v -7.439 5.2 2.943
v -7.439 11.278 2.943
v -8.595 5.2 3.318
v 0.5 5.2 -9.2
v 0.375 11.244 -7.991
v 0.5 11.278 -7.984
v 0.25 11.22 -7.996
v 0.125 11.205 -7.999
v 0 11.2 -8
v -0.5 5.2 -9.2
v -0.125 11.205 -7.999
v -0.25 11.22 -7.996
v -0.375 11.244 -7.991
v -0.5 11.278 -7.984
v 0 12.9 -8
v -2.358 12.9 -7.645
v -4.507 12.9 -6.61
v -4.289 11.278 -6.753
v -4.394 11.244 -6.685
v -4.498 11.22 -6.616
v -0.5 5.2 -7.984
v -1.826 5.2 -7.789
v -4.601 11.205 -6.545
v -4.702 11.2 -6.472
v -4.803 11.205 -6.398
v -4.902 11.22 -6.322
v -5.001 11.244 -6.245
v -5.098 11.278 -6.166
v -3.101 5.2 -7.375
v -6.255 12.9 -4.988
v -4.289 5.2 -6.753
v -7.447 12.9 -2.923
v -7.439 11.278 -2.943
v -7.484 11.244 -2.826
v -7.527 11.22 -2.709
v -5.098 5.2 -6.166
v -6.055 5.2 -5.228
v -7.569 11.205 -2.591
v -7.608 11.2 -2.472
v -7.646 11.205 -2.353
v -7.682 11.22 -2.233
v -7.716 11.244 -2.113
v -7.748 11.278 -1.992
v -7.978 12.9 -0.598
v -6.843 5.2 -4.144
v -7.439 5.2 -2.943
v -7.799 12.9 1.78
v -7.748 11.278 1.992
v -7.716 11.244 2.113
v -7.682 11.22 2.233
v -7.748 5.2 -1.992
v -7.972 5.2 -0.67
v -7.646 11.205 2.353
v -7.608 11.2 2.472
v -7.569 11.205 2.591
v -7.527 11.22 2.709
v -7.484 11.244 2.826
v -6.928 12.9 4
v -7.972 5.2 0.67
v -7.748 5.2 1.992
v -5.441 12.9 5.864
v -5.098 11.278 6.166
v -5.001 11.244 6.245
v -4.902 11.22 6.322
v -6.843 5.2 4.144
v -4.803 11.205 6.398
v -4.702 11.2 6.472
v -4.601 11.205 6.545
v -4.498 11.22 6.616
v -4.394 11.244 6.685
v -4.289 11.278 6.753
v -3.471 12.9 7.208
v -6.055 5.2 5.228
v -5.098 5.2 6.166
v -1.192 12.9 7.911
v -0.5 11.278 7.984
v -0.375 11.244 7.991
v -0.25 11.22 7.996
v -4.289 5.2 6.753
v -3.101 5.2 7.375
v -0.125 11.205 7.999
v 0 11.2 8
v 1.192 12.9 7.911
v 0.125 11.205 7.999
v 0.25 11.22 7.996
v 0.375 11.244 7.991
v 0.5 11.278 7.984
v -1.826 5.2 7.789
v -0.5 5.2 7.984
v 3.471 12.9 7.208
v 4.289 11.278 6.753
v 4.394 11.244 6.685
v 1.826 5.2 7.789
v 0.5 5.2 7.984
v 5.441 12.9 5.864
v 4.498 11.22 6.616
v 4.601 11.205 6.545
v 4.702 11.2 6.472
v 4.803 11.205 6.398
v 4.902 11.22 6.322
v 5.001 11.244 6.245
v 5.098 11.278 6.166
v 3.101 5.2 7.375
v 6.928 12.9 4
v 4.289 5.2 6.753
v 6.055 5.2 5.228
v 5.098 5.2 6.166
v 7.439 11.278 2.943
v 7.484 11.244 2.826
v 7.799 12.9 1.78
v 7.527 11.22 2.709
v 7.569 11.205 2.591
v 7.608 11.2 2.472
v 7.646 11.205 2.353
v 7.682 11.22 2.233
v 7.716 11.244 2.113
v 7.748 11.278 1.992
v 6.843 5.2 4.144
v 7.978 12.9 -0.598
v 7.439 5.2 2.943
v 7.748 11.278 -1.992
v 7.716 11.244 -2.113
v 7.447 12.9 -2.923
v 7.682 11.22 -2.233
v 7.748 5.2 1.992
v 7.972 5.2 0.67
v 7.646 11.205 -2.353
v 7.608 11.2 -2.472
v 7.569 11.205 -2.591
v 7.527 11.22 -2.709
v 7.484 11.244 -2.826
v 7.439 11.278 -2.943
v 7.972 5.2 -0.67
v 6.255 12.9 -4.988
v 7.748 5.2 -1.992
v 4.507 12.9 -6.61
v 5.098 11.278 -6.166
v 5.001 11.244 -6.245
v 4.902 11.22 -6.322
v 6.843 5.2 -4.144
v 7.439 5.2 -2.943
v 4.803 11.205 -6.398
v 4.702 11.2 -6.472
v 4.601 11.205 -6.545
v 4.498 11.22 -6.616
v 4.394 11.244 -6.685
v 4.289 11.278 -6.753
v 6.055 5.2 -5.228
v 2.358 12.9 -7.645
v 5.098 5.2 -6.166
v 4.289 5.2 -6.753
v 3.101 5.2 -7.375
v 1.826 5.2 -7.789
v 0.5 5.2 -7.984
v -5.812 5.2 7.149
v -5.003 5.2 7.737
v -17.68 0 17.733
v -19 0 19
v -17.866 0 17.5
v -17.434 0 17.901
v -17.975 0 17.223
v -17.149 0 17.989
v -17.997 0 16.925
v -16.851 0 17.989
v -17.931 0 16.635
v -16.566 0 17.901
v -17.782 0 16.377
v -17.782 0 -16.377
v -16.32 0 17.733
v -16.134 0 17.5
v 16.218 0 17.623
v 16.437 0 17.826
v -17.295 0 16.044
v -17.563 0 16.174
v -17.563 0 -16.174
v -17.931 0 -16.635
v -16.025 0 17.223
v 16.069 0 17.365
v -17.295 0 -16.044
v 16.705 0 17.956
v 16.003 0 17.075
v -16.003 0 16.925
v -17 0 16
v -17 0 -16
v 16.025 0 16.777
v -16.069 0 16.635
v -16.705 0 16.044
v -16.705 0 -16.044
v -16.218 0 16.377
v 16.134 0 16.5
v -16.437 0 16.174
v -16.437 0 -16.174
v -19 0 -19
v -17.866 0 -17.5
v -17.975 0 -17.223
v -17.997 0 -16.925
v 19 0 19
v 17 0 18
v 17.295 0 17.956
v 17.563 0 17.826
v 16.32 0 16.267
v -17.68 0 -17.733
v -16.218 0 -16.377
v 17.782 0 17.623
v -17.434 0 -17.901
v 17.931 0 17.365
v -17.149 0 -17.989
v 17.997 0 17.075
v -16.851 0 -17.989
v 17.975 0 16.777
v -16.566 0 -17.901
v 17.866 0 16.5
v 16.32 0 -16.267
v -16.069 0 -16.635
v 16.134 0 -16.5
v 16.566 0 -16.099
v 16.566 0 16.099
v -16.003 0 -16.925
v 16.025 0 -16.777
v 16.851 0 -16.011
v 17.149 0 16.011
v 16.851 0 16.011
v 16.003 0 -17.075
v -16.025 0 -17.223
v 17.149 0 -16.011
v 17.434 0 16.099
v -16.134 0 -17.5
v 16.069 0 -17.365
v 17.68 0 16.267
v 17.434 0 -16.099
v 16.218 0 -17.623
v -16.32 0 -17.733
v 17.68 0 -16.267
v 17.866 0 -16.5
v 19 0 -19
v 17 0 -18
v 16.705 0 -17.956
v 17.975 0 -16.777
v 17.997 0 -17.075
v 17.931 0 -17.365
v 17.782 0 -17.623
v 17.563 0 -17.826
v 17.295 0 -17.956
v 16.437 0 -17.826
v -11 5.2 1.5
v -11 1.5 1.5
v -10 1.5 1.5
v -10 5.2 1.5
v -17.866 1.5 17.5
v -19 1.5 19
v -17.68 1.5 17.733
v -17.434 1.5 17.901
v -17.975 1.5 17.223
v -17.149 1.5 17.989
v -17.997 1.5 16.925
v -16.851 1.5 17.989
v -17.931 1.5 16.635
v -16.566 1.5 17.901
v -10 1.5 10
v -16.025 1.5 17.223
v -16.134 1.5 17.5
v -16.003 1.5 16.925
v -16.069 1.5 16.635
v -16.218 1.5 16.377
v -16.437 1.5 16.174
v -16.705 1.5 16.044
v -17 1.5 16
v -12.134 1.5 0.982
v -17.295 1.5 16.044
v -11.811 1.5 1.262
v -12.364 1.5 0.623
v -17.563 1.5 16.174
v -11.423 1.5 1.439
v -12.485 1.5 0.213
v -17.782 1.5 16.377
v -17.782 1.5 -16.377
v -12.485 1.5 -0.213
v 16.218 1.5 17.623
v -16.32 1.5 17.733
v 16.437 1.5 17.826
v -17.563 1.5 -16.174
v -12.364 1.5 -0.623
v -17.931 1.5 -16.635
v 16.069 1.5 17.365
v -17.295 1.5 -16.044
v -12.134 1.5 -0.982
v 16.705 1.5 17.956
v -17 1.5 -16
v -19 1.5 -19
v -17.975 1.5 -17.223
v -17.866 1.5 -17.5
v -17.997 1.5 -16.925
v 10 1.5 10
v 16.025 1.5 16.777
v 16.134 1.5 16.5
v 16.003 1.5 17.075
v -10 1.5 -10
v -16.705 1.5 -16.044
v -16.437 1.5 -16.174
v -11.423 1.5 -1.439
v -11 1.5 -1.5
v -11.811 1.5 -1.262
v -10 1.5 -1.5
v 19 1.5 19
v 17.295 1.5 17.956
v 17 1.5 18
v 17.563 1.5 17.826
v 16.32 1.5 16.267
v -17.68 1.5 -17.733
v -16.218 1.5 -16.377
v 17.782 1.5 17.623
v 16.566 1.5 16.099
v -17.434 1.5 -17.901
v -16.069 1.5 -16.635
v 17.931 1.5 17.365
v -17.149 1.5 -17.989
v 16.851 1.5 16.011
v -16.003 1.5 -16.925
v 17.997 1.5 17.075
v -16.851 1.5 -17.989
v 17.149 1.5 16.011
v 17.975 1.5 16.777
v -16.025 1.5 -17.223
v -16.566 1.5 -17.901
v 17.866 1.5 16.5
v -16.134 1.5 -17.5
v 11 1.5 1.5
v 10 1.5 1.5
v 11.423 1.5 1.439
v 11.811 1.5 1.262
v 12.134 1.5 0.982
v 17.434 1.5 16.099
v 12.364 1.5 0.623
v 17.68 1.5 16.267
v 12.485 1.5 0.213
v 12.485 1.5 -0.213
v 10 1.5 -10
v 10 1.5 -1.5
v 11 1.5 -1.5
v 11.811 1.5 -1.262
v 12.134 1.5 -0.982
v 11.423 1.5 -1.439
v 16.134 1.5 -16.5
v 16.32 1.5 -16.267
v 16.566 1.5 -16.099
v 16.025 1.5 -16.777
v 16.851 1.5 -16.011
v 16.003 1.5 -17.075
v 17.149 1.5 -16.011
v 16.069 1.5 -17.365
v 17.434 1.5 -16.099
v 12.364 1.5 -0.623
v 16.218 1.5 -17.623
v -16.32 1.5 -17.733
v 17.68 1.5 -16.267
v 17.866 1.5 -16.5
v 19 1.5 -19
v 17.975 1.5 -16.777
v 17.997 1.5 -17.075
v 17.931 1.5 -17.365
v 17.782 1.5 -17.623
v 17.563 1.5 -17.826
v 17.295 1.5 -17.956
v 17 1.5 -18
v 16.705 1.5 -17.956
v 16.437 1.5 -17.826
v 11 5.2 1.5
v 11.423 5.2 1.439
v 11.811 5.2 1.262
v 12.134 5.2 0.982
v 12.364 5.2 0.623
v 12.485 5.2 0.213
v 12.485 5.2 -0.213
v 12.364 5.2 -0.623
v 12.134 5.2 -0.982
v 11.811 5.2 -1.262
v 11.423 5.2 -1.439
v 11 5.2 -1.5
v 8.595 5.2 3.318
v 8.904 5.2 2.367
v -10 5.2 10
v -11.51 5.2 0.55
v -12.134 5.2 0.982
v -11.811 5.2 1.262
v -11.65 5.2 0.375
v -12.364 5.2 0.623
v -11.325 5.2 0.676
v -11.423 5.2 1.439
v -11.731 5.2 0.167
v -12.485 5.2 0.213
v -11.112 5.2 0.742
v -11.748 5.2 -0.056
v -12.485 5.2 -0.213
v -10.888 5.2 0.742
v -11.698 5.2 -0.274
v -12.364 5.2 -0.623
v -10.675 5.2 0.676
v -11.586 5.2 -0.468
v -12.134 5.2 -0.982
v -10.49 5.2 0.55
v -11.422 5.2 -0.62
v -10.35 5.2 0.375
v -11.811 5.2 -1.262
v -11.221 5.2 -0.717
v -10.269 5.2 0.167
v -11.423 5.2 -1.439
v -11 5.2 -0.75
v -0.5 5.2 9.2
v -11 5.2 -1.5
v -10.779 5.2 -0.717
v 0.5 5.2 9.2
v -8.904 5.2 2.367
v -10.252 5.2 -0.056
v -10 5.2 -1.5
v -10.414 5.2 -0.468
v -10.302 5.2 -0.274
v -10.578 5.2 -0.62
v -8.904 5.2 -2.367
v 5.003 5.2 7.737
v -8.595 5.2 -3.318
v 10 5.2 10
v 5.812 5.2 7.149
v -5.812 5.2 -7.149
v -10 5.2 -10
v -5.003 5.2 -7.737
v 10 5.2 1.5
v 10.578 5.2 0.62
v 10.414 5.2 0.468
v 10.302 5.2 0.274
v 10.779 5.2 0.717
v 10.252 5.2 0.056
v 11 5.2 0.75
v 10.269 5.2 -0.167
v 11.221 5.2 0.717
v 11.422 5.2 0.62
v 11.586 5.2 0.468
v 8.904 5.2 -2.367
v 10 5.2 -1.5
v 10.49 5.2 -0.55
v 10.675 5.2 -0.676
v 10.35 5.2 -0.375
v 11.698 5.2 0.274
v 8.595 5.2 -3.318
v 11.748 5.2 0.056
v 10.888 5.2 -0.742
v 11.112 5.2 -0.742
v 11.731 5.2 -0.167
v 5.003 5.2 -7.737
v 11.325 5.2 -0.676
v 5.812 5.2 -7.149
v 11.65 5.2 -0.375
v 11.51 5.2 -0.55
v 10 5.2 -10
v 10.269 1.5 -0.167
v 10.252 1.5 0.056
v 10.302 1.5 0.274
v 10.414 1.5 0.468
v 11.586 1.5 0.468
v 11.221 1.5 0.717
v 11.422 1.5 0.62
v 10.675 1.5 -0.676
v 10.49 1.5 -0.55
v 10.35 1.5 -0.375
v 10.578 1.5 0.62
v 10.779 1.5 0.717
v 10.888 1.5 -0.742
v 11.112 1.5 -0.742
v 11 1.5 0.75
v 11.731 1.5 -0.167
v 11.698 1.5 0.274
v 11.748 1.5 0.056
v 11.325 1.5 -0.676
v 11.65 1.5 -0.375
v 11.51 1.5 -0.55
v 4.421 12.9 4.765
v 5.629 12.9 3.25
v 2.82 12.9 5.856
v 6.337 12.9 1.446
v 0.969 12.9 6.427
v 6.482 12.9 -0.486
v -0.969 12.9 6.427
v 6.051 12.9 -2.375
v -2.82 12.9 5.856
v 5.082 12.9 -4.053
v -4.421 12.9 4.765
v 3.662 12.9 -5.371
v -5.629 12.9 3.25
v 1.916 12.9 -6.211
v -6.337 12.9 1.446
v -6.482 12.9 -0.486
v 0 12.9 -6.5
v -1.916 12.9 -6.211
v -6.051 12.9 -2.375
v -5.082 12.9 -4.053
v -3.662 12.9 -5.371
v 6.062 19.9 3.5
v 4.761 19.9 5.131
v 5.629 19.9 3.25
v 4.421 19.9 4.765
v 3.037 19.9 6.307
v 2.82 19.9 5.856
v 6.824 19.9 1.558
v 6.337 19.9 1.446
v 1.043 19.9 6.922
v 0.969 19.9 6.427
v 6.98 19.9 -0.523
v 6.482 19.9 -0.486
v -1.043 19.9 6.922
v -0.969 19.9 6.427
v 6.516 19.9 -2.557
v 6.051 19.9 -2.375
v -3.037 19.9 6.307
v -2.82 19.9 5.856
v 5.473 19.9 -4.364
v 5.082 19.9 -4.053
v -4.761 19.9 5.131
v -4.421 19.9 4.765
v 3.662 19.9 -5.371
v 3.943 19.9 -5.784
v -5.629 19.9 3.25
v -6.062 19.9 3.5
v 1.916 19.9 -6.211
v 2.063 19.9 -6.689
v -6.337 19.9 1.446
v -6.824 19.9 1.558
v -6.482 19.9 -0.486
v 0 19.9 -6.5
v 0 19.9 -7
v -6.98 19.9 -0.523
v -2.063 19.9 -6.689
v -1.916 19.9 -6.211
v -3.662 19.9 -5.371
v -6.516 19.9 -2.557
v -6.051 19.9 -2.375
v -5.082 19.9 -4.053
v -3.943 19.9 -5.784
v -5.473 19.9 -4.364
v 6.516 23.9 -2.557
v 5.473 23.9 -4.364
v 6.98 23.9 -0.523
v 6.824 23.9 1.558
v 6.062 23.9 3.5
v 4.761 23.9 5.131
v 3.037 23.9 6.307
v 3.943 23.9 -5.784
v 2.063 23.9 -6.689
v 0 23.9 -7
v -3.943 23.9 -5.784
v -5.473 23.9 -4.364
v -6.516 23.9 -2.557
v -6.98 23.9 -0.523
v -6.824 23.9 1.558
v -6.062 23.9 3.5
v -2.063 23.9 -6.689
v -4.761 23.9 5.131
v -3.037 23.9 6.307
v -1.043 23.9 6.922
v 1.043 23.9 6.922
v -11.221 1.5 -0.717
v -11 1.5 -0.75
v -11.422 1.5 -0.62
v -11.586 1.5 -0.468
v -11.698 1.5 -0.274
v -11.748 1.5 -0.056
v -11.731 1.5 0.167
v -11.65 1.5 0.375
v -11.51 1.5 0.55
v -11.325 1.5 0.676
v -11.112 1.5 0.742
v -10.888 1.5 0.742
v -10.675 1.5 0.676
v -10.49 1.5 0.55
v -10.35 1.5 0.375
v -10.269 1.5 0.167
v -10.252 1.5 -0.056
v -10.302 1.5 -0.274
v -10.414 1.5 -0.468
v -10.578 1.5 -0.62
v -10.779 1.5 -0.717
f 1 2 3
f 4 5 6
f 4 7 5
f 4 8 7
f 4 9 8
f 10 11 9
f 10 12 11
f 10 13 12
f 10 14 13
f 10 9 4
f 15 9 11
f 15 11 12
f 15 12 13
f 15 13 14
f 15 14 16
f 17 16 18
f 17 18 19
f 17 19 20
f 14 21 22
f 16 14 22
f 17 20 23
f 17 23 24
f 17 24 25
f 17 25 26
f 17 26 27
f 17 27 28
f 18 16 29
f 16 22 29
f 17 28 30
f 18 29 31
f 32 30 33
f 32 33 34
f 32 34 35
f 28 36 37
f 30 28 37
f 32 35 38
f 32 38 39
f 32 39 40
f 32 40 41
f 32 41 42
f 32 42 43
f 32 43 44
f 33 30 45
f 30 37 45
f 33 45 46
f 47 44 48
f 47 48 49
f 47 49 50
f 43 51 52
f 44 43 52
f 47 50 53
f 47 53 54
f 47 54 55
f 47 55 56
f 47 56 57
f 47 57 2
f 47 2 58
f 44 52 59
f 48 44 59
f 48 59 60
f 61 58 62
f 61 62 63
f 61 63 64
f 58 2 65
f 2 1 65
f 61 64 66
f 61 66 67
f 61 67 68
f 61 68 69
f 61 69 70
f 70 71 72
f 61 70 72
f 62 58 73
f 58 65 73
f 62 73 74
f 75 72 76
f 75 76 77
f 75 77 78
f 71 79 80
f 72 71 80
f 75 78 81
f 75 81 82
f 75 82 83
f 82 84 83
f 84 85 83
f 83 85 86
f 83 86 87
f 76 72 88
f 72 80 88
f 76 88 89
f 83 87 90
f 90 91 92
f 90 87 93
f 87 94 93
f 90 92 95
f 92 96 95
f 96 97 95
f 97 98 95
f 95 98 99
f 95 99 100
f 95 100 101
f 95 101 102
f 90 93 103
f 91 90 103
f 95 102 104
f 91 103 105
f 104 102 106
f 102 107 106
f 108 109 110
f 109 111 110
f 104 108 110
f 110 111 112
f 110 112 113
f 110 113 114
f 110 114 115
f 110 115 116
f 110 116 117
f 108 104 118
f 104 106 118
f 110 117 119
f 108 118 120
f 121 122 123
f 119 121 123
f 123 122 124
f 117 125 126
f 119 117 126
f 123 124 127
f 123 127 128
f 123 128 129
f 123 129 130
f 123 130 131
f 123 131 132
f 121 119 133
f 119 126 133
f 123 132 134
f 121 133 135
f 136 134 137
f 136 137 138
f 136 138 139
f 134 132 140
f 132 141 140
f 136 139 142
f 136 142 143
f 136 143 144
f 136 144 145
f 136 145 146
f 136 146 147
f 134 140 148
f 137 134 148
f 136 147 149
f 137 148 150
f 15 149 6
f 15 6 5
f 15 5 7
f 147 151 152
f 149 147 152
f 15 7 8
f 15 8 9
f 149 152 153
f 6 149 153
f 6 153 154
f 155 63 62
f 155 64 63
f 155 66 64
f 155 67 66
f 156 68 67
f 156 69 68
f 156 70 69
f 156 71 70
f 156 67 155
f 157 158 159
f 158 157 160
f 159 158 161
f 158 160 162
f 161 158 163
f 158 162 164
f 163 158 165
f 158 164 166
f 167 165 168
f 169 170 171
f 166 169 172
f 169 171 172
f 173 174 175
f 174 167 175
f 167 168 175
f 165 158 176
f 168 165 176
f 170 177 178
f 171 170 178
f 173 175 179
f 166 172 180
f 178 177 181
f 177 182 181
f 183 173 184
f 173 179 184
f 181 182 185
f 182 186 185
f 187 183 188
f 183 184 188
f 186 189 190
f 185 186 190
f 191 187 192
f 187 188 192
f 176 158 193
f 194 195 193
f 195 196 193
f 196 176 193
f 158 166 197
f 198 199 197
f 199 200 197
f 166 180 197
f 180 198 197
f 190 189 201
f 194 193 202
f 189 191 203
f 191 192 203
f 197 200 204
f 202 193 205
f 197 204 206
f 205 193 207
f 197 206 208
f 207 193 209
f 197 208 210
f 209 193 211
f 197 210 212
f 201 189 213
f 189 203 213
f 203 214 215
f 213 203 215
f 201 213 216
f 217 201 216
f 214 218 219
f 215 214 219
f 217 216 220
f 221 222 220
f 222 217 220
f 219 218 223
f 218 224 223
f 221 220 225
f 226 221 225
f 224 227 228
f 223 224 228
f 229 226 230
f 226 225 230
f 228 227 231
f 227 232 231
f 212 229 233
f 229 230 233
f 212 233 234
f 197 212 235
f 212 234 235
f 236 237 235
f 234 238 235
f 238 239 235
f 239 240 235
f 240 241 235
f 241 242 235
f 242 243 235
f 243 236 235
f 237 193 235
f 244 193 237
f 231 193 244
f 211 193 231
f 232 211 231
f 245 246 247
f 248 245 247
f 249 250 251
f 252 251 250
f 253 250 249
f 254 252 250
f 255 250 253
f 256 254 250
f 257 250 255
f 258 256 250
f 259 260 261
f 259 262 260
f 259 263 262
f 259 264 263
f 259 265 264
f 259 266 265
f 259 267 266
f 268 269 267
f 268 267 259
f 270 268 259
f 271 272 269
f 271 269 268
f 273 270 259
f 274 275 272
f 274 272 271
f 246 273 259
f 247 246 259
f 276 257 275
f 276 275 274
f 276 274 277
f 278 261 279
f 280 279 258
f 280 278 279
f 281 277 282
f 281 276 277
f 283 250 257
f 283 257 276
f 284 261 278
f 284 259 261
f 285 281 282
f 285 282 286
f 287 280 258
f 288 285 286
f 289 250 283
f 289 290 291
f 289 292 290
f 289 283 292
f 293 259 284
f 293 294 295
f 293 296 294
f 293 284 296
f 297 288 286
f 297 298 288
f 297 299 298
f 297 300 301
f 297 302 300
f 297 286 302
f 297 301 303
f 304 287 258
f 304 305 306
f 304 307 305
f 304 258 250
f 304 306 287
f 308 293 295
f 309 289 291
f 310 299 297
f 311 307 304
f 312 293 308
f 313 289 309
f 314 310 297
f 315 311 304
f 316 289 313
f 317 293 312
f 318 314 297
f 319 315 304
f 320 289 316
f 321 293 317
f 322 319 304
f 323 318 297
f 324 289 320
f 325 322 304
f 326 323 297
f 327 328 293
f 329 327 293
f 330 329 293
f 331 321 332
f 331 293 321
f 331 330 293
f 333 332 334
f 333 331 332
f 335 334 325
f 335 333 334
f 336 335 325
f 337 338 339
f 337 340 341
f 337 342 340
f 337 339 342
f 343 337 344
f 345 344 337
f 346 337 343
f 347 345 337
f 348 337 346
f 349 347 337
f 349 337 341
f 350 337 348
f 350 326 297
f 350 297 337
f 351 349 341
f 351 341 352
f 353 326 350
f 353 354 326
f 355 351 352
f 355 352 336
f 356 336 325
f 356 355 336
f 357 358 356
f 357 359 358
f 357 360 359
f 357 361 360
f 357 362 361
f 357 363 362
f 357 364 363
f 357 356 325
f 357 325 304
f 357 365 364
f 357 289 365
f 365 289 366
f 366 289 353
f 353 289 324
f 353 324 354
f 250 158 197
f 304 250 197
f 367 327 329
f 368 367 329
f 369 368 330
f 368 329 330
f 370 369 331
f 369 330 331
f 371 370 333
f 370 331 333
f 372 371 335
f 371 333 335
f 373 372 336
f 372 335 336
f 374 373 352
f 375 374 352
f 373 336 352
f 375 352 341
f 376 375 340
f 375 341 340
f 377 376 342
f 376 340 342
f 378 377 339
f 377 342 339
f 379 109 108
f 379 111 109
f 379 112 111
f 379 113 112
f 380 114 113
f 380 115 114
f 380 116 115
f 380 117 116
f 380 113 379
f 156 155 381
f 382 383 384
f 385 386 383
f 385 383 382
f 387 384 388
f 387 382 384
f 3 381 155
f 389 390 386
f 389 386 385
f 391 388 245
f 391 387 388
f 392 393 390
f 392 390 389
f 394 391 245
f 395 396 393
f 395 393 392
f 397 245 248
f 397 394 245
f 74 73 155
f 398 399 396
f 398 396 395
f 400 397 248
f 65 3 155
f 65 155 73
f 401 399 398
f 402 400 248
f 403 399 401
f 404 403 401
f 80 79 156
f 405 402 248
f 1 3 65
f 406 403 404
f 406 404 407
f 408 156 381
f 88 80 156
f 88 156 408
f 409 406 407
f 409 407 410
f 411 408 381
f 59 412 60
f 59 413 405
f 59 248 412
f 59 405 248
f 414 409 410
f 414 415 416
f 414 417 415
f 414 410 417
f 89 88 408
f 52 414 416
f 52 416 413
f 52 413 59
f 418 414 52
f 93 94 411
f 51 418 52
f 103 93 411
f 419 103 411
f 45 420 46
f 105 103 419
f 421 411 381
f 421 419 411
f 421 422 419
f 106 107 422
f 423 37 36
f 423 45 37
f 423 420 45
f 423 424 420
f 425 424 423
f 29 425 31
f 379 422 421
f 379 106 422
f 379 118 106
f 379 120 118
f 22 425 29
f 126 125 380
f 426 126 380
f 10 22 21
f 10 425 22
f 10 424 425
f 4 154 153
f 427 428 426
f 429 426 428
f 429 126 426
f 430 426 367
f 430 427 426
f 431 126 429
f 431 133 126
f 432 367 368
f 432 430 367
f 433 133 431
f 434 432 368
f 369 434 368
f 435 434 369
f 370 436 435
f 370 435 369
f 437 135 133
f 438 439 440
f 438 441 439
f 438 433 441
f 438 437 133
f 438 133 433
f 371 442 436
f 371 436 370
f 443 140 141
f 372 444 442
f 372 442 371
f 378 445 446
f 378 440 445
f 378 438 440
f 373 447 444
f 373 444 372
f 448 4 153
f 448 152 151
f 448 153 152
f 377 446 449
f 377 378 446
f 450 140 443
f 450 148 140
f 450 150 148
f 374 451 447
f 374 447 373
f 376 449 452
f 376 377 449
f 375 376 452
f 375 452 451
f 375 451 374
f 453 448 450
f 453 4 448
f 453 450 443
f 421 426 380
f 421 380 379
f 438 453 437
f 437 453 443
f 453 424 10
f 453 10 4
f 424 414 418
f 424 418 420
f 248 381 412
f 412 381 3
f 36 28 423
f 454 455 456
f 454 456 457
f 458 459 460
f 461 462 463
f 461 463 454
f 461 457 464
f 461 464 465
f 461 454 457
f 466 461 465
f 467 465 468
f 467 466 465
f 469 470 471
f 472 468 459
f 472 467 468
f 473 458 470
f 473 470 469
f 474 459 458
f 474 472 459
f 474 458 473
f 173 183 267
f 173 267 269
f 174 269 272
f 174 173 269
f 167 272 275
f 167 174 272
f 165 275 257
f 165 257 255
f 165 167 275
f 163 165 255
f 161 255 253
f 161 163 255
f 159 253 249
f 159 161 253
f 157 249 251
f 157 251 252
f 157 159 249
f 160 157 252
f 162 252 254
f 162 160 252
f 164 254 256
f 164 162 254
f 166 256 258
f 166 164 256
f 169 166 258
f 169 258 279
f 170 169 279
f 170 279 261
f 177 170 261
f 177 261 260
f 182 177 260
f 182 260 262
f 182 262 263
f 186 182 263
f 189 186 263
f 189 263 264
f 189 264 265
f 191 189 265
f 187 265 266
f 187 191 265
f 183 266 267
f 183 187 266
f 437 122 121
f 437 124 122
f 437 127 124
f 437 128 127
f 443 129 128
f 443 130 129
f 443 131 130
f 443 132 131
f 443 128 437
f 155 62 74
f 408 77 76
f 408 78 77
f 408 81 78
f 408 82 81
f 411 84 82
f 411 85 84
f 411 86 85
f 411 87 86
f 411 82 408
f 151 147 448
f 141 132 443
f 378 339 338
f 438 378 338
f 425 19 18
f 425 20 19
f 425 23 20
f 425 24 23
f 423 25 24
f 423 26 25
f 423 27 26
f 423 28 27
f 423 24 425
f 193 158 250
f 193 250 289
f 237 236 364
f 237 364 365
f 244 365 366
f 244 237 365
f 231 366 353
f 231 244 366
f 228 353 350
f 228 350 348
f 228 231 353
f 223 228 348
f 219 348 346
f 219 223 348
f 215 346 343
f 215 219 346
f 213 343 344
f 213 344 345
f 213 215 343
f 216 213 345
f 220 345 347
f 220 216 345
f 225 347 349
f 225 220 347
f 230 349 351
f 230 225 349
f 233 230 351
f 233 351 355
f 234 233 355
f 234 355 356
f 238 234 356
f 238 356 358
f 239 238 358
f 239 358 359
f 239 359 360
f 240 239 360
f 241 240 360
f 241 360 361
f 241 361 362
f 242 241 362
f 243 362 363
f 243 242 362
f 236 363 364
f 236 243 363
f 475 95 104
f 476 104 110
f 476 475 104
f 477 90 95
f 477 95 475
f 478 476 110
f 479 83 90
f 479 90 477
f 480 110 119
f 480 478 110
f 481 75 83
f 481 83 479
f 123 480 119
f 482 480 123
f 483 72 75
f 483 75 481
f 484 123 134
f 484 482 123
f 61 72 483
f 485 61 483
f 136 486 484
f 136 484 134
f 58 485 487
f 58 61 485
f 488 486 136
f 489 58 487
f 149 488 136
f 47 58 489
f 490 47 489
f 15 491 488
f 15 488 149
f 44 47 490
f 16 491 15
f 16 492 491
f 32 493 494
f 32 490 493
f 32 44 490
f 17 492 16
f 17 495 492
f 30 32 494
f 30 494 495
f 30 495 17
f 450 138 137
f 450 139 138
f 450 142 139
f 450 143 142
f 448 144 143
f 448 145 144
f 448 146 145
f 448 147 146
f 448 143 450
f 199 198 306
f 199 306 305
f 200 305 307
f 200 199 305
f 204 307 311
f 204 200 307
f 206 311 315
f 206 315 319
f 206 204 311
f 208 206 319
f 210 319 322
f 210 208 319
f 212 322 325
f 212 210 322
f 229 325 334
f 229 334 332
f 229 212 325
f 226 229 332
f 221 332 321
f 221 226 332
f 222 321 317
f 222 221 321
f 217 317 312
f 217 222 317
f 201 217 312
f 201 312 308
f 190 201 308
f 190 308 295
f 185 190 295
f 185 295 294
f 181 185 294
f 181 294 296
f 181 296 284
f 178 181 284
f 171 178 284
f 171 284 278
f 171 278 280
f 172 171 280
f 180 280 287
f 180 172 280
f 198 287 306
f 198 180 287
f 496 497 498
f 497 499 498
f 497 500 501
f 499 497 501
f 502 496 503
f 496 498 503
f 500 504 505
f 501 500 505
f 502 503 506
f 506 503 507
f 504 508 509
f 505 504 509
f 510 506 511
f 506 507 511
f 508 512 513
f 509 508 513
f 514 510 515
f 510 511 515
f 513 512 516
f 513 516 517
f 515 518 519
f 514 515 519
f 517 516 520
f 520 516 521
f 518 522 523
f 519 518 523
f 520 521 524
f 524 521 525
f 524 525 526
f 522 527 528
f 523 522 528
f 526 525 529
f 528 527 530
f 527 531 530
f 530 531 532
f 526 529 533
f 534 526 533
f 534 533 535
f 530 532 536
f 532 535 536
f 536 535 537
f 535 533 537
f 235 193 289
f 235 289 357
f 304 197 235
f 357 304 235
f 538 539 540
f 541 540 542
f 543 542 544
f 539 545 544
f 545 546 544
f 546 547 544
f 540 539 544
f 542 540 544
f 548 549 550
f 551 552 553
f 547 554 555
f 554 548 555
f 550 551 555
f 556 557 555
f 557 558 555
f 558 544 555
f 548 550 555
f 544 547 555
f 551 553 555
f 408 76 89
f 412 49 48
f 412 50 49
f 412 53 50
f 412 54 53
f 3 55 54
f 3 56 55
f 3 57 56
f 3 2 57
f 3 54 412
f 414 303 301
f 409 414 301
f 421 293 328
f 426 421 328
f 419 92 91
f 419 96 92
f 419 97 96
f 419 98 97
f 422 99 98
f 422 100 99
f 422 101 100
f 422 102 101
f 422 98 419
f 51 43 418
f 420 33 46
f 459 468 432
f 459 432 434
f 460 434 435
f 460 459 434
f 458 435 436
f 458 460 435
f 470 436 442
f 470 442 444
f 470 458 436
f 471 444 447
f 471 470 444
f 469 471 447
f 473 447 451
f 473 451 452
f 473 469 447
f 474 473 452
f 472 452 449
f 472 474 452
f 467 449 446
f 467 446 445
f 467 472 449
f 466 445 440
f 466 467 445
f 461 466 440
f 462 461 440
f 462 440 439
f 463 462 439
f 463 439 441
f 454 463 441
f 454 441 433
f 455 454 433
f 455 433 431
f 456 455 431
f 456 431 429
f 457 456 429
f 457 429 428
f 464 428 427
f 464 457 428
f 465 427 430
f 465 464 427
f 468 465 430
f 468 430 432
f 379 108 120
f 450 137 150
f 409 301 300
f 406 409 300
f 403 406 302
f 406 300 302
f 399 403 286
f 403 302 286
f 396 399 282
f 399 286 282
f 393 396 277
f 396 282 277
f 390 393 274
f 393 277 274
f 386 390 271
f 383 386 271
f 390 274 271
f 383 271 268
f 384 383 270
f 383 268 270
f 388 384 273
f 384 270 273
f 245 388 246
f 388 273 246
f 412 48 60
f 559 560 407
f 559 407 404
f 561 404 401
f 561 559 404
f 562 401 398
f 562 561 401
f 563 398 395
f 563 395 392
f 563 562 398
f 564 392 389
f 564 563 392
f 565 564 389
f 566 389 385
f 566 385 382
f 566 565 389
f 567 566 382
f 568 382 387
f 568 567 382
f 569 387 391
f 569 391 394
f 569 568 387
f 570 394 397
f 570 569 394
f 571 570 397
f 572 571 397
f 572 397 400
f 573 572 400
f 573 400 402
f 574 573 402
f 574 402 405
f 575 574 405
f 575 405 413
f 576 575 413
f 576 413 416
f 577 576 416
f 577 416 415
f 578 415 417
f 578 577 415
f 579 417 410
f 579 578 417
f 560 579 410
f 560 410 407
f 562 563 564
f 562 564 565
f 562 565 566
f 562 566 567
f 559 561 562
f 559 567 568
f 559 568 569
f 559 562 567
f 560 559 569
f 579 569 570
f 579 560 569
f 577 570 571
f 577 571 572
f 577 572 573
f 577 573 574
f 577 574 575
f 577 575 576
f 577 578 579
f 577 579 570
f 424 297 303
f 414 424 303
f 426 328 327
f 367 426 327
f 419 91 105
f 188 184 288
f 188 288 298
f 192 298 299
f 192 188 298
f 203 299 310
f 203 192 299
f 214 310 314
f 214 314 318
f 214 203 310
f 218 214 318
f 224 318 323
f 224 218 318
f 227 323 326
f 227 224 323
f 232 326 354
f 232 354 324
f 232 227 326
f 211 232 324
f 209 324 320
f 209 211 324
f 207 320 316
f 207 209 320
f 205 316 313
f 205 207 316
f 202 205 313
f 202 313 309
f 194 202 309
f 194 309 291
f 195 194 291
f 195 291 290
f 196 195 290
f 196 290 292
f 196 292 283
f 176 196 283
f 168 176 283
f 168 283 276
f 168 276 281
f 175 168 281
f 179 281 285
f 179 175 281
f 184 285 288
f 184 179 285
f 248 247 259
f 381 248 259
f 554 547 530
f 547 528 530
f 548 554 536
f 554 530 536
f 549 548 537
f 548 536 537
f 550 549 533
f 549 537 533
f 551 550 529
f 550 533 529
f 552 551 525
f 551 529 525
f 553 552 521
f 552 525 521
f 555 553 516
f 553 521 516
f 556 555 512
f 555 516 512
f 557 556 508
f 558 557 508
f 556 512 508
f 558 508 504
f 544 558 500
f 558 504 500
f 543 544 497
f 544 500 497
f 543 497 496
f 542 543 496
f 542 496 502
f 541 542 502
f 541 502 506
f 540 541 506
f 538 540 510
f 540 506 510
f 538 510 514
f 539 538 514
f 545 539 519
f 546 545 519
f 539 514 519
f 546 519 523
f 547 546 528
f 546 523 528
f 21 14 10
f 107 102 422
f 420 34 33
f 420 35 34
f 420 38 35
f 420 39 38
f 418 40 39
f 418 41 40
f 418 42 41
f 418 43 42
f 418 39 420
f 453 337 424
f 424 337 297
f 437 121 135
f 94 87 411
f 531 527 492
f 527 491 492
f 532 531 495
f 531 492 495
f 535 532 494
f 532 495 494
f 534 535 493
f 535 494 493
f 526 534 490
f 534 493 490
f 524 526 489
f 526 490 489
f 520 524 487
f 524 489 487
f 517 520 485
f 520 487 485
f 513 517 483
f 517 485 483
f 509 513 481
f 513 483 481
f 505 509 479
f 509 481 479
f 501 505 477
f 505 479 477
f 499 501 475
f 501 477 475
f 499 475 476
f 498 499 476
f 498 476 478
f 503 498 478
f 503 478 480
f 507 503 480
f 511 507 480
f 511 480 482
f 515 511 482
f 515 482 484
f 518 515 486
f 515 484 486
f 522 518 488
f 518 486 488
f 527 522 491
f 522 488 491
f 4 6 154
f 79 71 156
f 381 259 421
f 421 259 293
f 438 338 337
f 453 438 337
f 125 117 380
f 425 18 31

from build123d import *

# Parameters (mm, degrees)
SKETCH_1_W          = 38
SKETCH_1_H          = 38
SKETCH_1_R          = 1
EXTRUDE_1_DEPTH     = 1.5
SKETCH_2_R          = 0.75
EXTRUDE_2_DEPTH     = 3.7
SKETCH1_R           = 8
BOSS_EXTRUDE1_DEPTH = 7.7
RIB1_REACH          = 31.806
SKETCH4_WALL_W      = 67.73123823
SKETCH4_WALL_H      = 1
CIRPATTERN1_COUNT   = 10


with BuildPart() as part:
    # 草图1 → 凸台-拉伸1 (new body)
    with BuildSketch(Plane(origin=(0, 0, 0), x_dir=(1, 0, 0), z_dir=(0, 1, 0))):
        Rectangle(SKETCH_1_W, SKETCH_1_H)
        with Locations(Location((-17, 17, 0), (0, 0, 270))):
            Circle(SKETCH_1_R, mode=Mode.SUBTRACT)
        with Locations(Location((17, 17, 0), (0, 0, 90))):
            Circle(SKETCH_1_R, mode=Mode.SUBTRACT)
        with Locations(Location((17, -17, 0), (0, 0, 270))):
            Circle(SKETCH_1_R, mode=Mode.SUBTRACT)
        with Locations(Location((-17, -17, 0), (0, 0, 90))):
            Circle(SKETCH_1_R, mode=Mode.SUBTRACT)
    extrude(amount=EXTRUDE_1_DEPTH)

    # 草图2 → 凸台-拉伸2 (add)
    with BuildSketch(Plane(origin=(0, 1.5, 0), x_dir=(1, 0, 0), z_dir=(0, 1, 0))):
        with BuildLine():
            Line((-10, -10), (10, -10))
            Line((10, -10), (10, -1.5))
            Line((10, -1.5), (11, -1.5))
            ThreePointArc((11, -1.5), (12.5, 0), (11, 1.5))
            Line((11, 1.5), (10, 1.5))
            Line((10, 1.5), (10, 10))
            Line((10, 10), (-10, 10))
            Line((-10, 10), (-10, 1.5))
            Line((-10, 1.5), (-11, 1.5))
            ThreePointArc((-11, 1.5), (-12.5, 0), (-11, -1.5))
            Line((-11, -1.5), (-10, -1.5))
            Line((-10, -1.5), (-10, -10))
        make_face()
        with Locations(Location((11, 0, 0), (0, 0, 270))):
            Circle(SKETCH_2_R, mode=Mode.SUBTRACT)
        with Locations(Location((-11, 0, 0), (0, 0, 90))):
            Circle(SKETCH_2_R, mode=Mode.SUBTRACT)
    extrude(amount=EXTRUDE_2_DEPTH)

    # Sketch1 → Boss-Extrude1 (add)
    with BuildSketch(Plane(origin=(0, 5.2, 0), x_dir=(1, 0, 0), z_dir=(0, 1, 0))):
        with Locations(Location((0, 0, 0), (0, 0, 90))):
            Circle(SKETCH1_R)
    extrude(amount=BOSS_EXTRUDE1_DEPTH)

    # Sketch4 wall → Rib1 (add, up to next)
    with BuildSketch(Plane(origin=(0, 8.2, -8.6), x_dir=(0, -0.980580675691, -0.196116135138), z_dir=(0, 0.196116135138, -0.980580675691)), mode=Mode.PRIVATE) as rib1_sk1:
        Rectangle(SKETCH4_WALL_W, SKETCH4_WALL_H)
    rib1_tool1 = extrude(rib1_sk1.sketch, amount=-RIB1_REACH, mode=Mode.PRIVATE) - part.part
    rib1 = rib1_tool1.solids().sort_by_distance((0, 8.2, -8.6))[0]
    add(rib1)

    # CirPattern1: Rib1 ×10 about axis
    cirpattern1_axis = Axis((0, 0, 0), (0, 1, 0))
    for i in range(1, CIRPATTERN1_COUNT):
        add(rib1.rotate(cirpattern1_axis, i * 360 / CIRPATTERN1_COUNT))

    # Sketch5 → Revolve1 (revolve)
    with BuildSketch(Plane(origin=(0, 0, 0), x_dir=(0, 0, -1), z_dir=(1, 0, 0))):
        Polygon((0, 23.9), (7, 23.9), (7, 19.9), (6.5, 19.9), (6.5, 12.9), (0, 12.9), align=None)
    revolve(axis=Axis((0, 12.9, 0), (0, 1, 0)))


solid = part.part
